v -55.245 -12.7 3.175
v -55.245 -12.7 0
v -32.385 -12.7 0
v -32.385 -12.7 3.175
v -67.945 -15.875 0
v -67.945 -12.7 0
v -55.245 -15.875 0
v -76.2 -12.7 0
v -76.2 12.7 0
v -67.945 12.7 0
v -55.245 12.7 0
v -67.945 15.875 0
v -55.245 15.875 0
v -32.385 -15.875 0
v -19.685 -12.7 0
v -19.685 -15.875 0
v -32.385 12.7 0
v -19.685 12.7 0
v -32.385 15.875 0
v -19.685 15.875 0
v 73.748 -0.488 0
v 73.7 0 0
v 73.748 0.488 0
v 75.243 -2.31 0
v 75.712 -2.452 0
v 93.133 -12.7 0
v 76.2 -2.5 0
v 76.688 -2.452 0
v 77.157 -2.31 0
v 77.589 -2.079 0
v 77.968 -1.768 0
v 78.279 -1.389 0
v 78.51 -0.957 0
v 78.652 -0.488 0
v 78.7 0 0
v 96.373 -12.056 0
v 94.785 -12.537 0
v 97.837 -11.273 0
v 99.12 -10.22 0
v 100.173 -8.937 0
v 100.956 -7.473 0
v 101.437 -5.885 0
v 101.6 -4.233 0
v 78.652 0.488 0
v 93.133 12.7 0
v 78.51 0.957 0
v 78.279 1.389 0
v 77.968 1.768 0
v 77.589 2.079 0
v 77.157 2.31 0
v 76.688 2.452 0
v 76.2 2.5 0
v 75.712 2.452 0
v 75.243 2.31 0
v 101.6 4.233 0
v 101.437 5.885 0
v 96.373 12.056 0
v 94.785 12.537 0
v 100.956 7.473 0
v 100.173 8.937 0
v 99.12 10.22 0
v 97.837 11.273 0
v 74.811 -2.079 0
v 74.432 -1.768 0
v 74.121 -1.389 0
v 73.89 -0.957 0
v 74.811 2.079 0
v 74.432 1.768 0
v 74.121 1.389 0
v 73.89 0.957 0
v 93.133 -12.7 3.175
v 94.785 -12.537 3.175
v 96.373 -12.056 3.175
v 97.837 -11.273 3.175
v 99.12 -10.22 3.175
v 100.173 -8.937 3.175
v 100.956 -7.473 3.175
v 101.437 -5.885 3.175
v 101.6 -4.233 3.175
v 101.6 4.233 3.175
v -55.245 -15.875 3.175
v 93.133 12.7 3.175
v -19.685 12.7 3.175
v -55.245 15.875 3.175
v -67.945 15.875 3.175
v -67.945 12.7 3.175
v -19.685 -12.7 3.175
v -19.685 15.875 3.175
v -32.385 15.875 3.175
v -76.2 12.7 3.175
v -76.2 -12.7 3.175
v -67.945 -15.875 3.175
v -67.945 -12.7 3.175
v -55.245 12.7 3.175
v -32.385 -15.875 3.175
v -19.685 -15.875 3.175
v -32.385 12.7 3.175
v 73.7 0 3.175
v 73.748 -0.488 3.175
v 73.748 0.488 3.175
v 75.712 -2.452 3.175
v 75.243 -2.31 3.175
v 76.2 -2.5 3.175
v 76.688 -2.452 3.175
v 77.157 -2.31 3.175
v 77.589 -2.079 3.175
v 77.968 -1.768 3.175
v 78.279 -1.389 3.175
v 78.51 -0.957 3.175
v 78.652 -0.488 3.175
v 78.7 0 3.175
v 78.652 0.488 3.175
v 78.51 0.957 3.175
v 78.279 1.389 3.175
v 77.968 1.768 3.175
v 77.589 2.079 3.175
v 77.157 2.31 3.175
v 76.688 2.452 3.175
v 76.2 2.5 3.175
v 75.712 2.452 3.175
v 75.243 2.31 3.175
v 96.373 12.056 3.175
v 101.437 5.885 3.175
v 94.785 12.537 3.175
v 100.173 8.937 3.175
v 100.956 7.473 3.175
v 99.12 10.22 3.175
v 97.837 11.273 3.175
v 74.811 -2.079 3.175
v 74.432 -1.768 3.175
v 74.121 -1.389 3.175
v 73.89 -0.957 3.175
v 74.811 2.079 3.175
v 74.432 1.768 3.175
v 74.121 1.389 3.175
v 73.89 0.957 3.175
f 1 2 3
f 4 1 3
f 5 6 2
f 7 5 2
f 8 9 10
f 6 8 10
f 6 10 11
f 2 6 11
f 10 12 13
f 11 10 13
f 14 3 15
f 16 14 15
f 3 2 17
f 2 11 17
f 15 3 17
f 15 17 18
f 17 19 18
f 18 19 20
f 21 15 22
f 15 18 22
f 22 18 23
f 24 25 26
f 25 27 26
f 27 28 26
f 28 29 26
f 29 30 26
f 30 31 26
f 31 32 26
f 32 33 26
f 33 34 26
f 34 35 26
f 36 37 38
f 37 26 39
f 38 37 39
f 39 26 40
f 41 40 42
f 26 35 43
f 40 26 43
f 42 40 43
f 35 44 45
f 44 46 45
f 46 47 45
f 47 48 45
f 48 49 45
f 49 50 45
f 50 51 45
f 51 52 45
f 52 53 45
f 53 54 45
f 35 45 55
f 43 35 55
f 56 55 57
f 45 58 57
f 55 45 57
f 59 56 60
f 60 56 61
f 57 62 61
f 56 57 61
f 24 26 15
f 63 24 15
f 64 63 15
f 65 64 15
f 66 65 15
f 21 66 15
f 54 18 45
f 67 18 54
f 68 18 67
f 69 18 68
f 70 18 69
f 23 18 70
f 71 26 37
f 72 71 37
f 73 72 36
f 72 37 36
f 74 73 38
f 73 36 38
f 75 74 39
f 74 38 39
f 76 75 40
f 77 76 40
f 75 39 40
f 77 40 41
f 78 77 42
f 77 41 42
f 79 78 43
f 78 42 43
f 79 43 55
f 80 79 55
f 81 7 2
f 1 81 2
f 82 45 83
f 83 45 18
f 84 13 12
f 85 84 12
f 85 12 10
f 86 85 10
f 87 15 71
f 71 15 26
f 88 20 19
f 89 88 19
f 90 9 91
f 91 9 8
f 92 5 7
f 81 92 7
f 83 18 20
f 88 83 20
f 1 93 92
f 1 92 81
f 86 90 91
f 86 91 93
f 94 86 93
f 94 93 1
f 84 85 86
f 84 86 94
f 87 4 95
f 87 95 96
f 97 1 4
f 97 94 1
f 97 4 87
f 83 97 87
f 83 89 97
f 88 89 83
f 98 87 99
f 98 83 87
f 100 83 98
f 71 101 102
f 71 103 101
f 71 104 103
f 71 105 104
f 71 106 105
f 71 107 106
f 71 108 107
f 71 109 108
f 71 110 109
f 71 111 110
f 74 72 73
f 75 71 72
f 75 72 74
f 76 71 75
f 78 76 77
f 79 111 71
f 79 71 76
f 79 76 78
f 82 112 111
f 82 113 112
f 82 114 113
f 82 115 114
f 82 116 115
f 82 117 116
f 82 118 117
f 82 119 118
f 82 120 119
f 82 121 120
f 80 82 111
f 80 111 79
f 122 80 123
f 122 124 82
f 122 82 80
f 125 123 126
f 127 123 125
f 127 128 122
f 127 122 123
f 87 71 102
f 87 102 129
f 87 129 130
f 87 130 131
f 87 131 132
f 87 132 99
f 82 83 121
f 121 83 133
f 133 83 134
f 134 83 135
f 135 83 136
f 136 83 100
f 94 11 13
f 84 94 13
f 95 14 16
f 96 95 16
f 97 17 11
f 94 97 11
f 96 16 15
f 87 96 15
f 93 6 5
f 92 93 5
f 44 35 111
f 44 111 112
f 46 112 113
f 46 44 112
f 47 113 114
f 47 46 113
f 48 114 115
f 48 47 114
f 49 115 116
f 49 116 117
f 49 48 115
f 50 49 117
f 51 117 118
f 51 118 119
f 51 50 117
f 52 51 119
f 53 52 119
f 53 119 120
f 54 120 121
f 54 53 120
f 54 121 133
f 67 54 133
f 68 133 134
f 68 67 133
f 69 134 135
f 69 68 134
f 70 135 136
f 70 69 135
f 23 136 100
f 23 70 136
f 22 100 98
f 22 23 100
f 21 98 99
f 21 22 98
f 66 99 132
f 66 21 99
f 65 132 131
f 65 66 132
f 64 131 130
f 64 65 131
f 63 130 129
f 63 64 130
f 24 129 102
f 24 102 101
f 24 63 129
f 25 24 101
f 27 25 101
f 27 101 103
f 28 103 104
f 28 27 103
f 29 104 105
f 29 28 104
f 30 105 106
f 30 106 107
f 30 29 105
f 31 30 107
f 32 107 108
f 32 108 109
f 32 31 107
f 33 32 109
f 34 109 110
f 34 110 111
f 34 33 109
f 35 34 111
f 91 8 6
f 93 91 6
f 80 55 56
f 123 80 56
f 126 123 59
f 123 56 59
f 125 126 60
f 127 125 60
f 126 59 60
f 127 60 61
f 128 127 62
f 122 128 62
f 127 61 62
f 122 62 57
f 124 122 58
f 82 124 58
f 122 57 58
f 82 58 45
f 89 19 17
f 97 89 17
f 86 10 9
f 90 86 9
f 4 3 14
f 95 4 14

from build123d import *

# Parameters (mm, degrees)
F0_R     = 2.5
F1_DEPTH = 3.175


with BuildPart() as f1:
    # F0 (on Top) → F1 (new body)
    with BuildSketch(Plane.XY):
        with BuildLine():
            Line((-69.85, 12.7), (-76.2, 12.7))
            Line((-76.2, 12.7), (-76.2, -12.7))
            Line((-76.2, -12.7), (-69.85, -12.7))
            Line((-69.85, -12.7), (-67.945, -12.7))
            Line((-67.945, -12.7), (-67.945, -15.875))
            Line((-67.945, -15.875), (-55.245, -15.875))
            Line((-55.245, -15.875), (-55.245, -12.7))
            Line((-55.245, -12.7), (-53.34, -12.7))
            Line((-53.34, -12.7), (-34.29, -12.7))
            Line((-34.29, -12.7), (-32.385, -12.7))
            Line((-32.385, -12.7), (-32.385, -15.875))
            Line((-32.385, -15.875), (-19.685, -15.875))
            Line((-19.685, -15.875), (-19.685, -12.7))
            Line((-19.685, -12.7), (62.480263, -12.7))
            Line((62.480263, -12.7), (63.47136, -12.7))
            Line((63.47136, -12.7), (88.92864, -12.7))
            Line((88.92864, -12.7), (89.919737, -12.7))
            Line((89.919737, -12.7), (93.133333, -12.7))
            ThreePointArc((93.133333, -12.7), (99.120171, -10.220171), (101.6, -4.233333))
            Line((101.6, -4.233333), (101.6, 4.233333))
            ThreePointArc((101.6, 4.233333), (99.120171, 10.220171), (93.133333, 12.7))
            Line((93.133333, 12.7), (76.2, 12.7))
            Line((76.2, 12.7), (-19.685, 12.7))
            Line((-19.685, 12.7), (-19.685, 15.875))
            Line((-19.685, 15.875), (-32.385, 15.875))
            Line((-32.385, 15.875), (-32.385, 12.7))
            Line((-32.385, 12.7), (-34.29, 12.7))
            Line((-34.29, 12.7), (-53.34, 12.7))
            Line((-53.34, 12.7), (-55.245, 12.7))
            Line((-55.245, 12.7), (-55.245, 15.875))
            Line((-55.245, 15.875), (-67.945, 15.875))
            Line((-67.945, 15.875), (-67.945, 12.7))
            Line((-67.945, 12.7), (-69.85, 12.7))
        make_face()
        with Locations((76.2, 0)):
            Circle(F0_R, mode=Mode.SUBTRACT)
    extrude(amount=F1_DEPTH)


solid = f1.part
